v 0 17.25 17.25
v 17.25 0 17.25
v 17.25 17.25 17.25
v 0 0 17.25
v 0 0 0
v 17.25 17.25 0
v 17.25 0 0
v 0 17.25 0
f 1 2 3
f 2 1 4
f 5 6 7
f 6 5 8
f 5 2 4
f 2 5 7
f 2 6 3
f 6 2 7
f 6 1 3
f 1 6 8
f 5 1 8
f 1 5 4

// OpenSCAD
/*
Creating 
a slightly different cube
*/
//cube([25,35,55],true);

/* 
no parameters creates a ...
normalised cube : [1,1,1]
*/
// cube();

// side lengths of 50, 5 and 10
//cube([50,5,10]);
//cube([50,5,10],true);

// a perfect cube with side length of 17.25.
cube(17.25);
//cube(17.25,true);
